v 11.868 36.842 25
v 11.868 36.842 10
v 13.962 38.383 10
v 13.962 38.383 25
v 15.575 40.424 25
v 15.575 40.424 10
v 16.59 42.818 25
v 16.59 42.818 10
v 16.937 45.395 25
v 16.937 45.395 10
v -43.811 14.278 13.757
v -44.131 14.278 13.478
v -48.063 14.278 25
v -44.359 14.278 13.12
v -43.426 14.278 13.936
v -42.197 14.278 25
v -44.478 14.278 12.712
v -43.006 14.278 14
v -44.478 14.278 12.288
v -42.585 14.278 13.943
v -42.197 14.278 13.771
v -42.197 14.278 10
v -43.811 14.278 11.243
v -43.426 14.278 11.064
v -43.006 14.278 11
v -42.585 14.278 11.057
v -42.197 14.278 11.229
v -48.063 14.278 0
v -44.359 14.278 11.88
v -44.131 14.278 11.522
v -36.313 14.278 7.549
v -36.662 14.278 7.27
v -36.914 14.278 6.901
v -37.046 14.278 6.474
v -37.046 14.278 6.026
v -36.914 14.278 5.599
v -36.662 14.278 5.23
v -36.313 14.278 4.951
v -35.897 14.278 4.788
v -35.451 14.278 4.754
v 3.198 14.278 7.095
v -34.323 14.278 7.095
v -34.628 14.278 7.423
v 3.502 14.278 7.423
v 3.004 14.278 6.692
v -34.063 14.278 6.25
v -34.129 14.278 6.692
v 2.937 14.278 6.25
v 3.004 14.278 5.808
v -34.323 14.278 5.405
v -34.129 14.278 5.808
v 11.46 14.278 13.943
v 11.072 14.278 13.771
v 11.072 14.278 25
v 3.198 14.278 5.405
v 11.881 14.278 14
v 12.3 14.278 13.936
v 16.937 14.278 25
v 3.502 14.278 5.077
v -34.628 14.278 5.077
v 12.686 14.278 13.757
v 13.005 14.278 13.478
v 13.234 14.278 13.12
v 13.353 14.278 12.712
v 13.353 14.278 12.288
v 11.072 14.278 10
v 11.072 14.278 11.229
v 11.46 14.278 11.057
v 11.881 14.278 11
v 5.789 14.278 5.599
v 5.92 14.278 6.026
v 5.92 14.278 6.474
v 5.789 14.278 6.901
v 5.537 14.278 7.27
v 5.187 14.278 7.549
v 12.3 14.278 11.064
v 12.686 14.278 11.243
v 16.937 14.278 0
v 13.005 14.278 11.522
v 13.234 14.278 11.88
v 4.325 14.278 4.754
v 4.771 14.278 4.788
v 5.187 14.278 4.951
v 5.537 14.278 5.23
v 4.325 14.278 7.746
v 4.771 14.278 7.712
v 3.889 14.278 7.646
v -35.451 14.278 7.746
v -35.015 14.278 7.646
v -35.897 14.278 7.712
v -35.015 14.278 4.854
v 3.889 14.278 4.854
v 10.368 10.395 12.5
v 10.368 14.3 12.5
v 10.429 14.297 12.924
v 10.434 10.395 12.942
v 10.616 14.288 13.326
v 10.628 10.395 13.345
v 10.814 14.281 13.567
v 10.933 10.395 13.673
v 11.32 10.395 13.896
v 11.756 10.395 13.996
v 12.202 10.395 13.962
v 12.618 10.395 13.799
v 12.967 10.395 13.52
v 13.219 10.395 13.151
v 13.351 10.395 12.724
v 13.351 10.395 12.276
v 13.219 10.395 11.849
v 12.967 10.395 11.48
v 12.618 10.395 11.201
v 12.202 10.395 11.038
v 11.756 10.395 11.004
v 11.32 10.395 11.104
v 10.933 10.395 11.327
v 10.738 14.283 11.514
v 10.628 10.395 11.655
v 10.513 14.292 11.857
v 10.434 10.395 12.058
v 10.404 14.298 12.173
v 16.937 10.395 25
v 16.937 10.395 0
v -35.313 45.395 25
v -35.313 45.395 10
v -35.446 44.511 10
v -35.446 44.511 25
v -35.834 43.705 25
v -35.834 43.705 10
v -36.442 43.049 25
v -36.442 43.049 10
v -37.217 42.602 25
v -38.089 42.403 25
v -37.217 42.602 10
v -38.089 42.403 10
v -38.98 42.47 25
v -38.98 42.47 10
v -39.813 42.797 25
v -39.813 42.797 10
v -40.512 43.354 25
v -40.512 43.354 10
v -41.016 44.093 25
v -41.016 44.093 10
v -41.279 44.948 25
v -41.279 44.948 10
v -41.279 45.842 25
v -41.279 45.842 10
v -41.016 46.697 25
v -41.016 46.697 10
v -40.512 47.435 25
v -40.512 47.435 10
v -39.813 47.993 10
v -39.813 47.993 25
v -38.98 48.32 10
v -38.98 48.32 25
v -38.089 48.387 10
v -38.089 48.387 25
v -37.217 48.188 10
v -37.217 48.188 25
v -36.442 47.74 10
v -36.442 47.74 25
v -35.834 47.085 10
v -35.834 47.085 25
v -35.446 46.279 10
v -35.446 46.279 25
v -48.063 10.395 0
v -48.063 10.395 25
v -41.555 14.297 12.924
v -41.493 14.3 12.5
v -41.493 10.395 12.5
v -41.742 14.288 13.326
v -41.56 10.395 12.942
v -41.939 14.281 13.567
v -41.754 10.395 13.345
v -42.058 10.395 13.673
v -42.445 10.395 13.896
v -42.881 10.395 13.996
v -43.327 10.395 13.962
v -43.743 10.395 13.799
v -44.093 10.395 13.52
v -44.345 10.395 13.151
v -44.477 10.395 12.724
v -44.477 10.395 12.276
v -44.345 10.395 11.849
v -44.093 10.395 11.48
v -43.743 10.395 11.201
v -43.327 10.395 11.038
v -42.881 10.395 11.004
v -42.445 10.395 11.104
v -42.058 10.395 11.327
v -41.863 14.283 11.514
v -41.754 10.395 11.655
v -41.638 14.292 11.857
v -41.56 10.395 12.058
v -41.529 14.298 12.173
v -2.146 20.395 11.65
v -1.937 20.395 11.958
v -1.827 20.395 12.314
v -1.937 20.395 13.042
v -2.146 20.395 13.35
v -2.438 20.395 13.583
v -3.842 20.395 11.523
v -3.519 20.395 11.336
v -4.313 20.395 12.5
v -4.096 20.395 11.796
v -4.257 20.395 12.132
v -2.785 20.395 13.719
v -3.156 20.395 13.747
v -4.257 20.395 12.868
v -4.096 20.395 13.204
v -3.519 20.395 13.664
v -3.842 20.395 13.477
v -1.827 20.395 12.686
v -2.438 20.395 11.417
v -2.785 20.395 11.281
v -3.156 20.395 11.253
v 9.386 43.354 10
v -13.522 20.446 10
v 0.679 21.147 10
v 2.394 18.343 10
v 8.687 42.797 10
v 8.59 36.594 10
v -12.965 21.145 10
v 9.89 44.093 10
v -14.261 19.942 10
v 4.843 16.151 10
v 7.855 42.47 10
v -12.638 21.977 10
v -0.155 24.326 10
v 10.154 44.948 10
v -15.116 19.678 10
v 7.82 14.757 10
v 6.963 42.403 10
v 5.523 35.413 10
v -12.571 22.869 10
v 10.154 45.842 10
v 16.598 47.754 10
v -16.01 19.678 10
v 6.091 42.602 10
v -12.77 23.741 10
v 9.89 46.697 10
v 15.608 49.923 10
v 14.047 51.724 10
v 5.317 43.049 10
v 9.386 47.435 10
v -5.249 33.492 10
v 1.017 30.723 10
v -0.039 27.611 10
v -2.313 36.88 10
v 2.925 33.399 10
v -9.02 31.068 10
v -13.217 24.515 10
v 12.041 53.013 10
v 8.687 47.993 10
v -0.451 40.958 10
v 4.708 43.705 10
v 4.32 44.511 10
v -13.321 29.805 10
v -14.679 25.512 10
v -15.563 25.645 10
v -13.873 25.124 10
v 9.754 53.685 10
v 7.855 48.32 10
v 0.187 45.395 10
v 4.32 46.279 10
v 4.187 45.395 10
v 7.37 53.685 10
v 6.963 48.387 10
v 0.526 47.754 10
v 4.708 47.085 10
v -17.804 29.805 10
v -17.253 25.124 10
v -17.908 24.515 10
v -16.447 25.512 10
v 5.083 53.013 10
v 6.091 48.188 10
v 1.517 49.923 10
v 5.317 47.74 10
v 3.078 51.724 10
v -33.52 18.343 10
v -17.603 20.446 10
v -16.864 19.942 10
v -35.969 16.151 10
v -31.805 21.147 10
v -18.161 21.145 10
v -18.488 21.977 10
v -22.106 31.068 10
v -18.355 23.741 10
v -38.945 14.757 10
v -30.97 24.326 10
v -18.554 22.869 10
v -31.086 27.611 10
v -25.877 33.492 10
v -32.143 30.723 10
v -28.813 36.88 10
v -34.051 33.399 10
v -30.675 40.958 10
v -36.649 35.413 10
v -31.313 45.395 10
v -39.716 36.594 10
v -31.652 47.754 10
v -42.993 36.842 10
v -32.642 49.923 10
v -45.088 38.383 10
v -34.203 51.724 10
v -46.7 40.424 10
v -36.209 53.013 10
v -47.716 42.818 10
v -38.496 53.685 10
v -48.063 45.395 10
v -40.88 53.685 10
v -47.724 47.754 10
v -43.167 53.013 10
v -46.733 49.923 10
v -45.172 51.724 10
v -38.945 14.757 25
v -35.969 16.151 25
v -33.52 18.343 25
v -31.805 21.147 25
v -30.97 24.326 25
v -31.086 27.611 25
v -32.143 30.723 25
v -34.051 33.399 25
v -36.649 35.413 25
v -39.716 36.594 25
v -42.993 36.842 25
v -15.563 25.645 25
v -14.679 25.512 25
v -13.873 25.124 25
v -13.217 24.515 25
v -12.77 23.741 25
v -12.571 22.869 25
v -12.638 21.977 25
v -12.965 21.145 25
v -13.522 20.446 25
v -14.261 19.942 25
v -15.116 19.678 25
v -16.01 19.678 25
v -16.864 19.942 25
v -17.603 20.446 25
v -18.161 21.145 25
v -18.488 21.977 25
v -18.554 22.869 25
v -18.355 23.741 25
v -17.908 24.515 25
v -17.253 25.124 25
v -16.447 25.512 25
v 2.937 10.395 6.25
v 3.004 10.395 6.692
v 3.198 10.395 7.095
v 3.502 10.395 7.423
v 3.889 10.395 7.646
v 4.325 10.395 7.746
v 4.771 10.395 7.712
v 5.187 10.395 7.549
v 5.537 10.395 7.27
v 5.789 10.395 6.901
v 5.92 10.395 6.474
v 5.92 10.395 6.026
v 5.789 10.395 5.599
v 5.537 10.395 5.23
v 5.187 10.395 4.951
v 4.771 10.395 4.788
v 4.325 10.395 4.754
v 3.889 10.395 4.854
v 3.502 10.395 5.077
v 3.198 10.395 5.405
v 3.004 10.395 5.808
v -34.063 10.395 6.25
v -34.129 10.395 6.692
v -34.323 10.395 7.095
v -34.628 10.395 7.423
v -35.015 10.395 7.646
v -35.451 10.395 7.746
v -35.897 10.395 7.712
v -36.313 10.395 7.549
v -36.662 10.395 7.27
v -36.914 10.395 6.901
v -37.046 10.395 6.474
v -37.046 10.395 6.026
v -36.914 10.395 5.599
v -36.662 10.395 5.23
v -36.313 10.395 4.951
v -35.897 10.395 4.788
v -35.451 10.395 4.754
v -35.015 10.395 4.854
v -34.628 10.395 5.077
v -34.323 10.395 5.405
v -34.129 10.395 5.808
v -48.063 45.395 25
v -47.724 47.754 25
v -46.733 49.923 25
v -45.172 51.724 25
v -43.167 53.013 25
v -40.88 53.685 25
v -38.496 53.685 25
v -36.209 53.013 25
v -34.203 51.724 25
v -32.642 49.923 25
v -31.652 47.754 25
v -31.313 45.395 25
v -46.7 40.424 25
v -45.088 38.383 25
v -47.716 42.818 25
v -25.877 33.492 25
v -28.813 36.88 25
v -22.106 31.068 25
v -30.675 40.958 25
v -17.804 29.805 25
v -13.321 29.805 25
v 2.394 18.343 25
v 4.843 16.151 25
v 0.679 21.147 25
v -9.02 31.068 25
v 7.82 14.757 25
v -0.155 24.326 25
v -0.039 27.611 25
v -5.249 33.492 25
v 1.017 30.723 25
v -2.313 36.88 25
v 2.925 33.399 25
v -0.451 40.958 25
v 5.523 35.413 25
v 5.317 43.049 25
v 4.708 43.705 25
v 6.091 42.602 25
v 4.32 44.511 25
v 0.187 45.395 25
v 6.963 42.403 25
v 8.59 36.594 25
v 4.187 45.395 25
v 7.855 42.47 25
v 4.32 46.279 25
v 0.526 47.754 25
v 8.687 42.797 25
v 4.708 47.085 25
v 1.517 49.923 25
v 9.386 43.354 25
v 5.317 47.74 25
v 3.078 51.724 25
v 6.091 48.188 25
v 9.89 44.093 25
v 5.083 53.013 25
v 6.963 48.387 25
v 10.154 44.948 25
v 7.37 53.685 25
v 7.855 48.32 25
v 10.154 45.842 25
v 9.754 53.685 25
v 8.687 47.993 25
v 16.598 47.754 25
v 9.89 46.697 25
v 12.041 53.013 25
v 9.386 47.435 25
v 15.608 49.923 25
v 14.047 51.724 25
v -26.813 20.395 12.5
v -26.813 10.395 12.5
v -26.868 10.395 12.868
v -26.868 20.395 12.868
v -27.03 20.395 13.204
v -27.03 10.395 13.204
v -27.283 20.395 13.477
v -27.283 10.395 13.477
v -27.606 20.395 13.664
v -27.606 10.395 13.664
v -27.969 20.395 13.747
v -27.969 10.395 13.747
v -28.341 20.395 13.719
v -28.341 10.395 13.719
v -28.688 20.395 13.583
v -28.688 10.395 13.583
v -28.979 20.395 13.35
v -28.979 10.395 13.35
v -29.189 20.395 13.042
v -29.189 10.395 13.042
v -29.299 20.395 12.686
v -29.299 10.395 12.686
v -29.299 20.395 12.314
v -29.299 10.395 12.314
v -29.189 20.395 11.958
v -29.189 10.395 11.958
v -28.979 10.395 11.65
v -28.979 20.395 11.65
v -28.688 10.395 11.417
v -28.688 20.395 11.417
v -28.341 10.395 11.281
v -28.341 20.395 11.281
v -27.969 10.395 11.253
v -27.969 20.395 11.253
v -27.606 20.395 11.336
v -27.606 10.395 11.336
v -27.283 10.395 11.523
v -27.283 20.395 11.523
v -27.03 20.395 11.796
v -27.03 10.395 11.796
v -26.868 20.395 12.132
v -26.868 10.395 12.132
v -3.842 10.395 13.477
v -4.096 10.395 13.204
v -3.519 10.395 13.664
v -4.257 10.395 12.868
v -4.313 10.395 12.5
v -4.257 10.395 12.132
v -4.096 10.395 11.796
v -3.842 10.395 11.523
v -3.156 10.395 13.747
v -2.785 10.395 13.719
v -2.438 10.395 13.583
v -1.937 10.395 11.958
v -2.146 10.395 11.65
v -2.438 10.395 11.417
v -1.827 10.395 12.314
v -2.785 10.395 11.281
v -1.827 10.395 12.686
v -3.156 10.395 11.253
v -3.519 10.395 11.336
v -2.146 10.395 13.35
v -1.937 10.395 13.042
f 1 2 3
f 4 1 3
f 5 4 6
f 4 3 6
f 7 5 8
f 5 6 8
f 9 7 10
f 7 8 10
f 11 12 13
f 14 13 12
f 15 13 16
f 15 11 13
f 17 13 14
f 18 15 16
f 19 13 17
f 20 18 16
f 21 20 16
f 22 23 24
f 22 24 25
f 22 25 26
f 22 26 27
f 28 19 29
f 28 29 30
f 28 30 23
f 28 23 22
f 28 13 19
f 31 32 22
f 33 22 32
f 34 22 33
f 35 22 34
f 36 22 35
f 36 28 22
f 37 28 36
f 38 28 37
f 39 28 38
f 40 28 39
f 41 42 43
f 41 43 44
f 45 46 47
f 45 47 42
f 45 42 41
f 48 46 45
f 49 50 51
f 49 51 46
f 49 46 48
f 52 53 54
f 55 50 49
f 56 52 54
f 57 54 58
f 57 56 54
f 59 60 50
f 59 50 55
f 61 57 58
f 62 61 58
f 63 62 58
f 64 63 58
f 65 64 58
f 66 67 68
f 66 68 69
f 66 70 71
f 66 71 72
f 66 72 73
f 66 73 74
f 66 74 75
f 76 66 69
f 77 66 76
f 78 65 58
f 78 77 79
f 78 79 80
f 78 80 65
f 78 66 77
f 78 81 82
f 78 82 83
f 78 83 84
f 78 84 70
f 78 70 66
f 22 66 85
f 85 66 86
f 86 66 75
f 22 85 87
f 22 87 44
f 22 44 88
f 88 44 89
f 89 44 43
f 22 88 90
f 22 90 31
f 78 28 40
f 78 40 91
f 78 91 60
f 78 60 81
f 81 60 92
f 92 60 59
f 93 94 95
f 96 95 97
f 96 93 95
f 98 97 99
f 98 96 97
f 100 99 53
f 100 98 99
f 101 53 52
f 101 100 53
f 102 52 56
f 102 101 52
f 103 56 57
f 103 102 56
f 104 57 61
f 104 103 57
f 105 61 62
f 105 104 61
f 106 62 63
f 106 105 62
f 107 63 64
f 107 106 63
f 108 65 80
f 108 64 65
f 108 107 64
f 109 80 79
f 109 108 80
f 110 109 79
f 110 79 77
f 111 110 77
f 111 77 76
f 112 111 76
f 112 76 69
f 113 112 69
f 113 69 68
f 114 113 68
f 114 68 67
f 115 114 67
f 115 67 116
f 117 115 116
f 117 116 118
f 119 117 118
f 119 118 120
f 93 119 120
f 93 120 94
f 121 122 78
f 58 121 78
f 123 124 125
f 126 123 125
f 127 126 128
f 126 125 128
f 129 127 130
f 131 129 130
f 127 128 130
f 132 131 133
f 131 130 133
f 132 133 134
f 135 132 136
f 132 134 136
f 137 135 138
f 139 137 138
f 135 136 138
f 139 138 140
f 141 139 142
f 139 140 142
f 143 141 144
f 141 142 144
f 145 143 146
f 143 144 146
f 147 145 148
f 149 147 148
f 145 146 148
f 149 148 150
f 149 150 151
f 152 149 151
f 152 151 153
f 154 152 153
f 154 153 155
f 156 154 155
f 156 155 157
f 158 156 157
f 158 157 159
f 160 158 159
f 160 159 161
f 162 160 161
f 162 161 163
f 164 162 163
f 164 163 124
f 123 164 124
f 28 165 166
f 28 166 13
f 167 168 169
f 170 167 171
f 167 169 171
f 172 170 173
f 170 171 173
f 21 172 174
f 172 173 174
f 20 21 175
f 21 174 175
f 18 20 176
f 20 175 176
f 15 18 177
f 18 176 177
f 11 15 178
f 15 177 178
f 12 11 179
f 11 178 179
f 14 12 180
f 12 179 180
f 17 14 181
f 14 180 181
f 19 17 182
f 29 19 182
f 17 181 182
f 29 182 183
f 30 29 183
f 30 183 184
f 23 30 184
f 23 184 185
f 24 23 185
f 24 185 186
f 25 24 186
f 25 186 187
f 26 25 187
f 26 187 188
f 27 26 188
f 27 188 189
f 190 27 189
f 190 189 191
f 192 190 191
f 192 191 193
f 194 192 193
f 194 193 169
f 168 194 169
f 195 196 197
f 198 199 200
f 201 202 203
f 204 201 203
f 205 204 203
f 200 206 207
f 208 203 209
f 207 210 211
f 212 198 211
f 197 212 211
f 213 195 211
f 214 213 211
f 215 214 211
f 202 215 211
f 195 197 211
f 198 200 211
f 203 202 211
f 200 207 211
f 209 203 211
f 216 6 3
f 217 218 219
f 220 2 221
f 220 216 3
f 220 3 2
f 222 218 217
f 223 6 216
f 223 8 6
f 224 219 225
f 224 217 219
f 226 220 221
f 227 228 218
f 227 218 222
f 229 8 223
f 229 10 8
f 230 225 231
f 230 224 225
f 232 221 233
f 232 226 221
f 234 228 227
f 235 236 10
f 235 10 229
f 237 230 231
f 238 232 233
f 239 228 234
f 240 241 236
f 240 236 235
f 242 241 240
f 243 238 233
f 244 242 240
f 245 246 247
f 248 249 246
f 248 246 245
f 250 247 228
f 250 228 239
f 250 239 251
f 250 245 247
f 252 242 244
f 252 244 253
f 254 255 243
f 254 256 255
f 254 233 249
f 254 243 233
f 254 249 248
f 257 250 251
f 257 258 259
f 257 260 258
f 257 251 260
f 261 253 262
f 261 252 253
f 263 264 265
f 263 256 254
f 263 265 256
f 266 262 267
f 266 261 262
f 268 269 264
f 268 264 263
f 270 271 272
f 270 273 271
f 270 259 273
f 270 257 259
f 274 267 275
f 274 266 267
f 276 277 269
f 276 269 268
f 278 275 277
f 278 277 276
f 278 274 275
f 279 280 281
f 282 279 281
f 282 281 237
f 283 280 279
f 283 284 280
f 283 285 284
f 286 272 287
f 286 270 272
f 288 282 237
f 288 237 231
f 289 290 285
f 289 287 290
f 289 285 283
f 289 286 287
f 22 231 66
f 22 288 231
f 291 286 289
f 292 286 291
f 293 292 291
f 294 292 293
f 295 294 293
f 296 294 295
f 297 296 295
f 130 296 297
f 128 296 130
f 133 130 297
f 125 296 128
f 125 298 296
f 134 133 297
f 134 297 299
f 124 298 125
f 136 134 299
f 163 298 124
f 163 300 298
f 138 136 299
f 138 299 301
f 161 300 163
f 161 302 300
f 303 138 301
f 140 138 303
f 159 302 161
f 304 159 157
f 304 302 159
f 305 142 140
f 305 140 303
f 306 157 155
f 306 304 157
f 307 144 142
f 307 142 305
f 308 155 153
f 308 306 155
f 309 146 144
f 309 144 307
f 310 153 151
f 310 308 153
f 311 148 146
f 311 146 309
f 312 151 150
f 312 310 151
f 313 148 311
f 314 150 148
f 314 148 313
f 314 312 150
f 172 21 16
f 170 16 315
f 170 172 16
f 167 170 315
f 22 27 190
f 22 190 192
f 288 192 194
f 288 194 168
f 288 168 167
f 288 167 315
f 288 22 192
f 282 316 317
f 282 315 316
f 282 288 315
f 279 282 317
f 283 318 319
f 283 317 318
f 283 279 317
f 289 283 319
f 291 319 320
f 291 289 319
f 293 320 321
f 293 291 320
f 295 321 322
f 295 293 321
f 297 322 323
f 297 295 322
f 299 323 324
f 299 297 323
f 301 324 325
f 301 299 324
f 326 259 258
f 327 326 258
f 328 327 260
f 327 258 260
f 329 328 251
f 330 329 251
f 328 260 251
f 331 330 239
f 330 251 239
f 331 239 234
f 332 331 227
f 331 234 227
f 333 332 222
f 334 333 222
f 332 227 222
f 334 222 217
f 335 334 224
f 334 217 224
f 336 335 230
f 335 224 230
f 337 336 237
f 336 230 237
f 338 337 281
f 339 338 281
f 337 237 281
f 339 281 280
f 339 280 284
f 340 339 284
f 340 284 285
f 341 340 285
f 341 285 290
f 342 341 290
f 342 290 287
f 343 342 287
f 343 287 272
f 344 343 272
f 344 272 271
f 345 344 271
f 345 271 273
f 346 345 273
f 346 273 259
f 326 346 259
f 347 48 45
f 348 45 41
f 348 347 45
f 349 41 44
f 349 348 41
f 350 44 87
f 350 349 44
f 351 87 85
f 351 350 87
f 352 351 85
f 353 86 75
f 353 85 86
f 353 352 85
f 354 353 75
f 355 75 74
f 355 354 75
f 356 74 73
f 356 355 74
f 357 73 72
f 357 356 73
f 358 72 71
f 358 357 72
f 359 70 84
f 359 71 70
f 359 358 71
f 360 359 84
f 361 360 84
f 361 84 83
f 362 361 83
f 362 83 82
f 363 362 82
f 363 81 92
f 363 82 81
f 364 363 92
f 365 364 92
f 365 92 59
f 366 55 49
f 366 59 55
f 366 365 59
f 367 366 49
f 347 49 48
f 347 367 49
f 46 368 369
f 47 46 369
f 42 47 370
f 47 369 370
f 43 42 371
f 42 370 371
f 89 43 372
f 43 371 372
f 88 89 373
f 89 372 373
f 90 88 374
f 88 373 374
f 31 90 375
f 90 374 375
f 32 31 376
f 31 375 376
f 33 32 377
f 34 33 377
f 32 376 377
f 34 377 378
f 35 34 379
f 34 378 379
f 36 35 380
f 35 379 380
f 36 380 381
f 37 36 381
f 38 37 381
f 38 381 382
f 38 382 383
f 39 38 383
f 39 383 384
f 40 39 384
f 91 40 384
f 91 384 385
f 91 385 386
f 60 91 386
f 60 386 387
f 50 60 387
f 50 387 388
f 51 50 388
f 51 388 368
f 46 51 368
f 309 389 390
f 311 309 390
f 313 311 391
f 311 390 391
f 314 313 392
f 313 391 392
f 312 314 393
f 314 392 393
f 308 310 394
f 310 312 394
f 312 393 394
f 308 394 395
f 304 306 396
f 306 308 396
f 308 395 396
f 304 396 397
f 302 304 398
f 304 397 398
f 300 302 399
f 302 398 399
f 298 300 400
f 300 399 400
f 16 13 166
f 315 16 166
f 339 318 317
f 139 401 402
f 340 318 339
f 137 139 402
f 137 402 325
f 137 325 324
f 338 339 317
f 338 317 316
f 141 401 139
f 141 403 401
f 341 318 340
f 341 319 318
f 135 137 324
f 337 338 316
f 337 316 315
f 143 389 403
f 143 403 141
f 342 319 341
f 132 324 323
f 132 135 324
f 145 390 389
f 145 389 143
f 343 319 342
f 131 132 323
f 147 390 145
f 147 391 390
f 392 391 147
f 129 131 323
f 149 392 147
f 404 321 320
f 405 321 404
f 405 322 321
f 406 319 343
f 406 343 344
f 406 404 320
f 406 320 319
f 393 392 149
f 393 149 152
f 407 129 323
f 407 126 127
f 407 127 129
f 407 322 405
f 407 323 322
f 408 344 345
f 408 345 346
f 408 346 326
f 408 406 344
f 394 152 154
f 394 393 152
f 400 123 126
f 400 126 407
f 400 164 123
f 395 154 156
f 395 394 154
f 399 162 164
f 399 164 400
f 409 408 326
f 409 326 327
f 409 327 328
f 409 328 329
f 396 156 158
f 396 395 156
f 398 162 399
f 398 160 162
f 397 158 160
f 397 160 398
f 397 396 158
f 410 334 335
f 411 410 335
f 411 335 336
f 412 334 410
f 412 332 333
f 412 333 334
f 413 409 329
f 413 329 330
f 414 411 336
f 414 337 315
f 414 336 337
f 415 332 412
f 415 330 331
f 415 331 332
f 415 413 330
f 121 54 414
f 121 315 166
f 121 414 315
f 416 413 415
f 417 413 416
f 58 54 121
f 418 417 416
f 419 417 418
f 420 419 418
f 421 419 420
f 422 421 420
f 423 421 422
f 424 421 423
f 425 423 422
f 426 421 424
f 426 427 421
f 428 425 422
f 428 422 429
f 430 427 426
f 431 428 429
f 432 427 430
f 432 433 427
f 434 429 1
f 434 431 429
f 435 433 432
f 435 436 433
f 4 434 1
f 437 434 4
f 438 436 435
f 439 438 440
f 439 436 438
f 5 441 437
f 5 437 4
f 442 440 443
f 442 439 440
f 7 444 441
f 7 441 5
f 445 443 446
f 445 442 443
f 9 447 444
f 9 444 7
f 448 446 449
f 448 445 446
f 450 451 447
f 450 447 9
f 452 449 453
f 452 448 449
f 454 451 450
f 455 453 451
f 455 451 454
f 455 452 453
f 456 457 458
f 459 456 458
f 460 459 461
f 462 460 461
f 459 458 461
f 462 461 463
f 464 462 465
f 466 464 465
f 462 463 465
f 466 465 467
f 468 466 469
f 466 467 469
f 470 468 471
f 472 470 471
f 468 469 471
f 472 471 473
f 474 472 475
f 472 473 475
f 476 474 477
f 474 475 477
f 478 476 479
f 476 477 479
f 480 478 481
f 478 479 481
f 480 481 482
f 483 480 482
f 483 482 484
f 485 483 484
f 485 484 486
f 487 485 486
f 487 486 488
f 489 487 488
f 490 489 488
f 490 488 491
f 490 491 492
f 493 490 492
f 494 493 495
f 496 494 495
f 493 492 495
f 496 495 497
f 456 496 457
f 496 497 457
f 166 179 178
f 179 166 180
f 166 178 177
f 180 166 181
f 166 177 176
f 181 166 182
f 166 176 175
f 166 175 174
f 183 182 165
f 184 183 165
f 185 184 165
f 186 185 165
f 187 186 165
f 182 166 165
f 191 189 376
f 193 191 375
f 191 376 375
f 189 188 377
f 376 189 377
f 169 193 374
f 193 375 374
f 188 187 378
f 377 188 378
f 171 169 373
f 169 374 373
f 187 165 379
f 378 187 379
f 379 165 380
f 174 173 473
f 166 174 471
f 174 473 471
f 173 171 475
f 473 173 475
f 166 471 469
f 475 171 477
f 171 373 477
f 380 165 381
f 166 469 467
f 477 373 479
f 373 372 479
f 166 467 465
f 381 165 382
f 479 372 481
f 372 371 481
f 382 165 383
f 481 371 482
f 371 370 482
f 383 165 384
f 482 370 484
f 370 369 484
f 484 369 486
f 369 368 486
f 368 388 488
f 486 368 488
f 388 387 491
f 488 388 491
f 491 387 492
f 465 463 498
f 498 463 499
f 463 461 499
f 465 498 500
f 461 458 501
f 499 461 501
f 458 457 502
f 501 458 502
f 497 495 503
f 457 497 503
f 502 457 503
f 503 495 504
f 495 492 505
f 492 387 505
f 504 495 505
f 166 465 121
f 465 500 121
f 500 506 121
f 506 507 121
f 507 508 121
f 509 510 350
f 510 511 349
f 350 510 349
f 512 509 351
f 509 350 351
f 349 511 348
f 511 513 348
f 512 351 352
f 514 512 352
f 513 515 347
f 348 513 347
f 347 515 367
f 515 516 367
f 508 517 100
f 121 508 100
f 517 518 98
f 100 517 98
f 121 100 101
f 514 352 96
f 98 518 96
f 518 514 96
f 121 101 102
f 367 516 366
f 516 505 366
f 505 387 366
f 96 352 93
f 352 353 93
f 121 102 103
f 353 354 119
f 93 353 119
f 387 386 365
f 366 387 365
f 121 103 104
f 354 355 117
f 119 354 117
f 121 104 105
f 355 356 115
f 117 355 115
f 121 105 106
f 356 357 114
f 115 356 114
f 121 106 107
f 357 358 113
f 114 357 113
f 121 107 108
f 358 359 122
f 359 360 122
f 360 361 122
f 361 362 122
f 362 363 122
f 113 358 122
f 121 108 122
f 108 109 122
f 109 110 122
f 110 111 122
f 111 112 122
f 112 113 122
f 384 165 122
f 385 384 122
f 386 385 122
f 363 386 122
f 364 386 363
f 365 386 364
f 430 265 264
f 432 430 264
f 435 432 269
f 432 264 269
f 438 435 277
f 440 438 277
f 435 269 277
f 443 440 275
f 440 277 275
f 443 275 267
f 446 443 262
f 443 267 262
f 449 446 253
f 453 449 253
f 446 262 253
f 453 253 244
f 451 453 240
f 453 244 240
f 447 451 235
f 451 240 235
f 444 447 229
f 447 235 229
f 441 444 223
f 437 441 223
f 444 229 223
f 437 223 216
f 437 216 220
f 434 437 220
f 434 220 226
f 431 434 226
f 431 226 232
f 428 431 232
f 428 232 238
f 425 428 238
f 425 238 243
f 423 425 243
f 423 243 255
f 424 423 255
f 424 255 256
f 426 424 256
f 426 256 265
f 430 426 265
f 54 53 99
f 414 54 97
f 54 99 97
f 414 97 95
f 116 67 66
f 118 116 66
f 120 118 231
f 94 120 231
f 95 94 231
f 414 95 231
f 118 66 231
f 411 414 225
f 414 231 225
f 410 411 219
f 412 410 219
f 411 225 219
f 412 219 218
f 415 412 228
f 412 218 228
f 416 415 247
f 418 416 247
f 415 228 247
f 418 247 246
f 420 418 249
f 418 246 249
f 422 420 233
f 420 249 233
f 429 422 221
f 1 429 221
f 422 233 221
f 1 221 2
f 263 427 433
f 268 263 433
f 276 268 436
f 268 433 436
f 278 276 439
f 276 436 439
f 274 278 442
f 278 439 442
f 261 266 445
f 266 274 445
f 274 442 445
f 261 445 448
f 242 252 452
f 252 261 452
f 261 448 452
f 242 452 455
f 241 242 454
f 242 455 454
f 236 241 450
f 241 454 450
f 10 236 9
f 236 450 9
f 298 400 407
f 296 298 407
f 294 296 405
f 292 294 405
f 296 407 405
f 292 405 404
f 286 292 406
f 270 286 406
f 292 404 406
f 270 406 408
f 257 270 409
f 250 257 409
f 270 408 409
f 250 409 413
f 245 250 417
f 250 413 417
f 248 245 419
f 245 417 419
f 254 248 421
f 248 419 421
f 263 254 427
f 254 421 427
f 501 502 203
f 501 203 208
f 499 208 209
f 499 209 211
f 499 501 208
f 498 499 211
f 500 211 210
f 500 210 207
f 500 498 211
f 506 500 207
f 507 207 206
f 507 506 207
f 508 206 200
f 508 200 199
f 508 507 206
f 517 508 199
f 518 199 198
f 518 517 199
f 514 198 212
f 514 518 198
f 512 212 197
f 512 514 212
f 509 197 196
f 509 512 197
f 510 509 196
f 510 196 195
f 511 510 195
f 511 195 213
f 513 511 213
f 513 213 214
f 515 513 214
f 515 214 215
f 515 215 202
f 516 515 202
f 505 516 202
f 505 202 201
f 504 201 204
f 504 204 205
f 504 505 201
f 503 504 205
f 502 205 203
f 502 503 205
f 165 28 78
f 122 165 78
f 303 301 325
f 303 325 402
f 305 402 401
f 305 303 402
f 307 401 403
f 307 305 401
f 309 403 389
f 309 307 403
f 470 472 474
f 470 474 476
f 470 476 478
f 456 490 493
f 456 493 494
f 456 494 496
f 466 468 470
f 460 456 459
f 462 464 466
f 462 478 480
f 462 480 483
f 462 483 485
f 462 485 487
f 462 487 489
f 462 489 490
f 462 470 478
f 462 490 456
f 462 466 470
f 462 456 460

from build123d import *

# Parameters (mm, degrees)
SKETCH_1_W               = 65
SKETCH_1_H               = 70
EXTRUDE_1_DEPTH          = 25
SKETCH_2_R               = 15.75
CUT_EXTRUDE_1_DEPTH      = 26
SKETCH_4_R               = 3
CUT_EXTRUDE_2_DEPTH      = 40
PATTERN_CIRCULAR_1_COUNT = 4
CUT_EXTRUDE_3_DEPTH      = 26
CUT_EXTRUDE_START        = -26
CUT_EXTRUDE_5_DEPTH      = 46
SKETCH_8_R               = 1.25
SKETCH_8_R_2             = 1.5
CUT_EXTRUDE_6_DEPTH      = 10
SKETCH_9_W               = 81.802440552
SKETCH_9_H               = 62.233215756
CUT_EXTRUDE_7_DEPTH      = 10


with BuildPart() as part:
    # 草图1 → 凸台-拉伸1 (new body)
    with BuildSketch(Plane.XY):
        with Locations((-15.56280925, 45.394966444)):
            Rectangle(SKETCH_1_W, SKETCH_1_H)
    extrude(amount=EXTRUDE_1_DEPTH)

    # 草图2 → 切除-拉伸1 (cut, through all)
    with BuildSketch(Plane.XY.offset(25)):
        with Locations((-15.56280925, 45.394966444)):
            Circle(SKETCH_2_R)
    extrude(amount=-CUT_EXTRUDE_1_DEPTH, mode=Mode.SUBTRACT)

    # 草图4 → 切除-拉伸2 (cut)
    with BuildSketch(Plane(origin=(0, 0, 0), x_dir=(-1, 0, 0), z_dir=(0, 0, -1))):
        with Locations((-7.18719075, 45.394966444)):
            Circle(SKETCH_4_R)
    cut_extrude_2 = extrude(amount=-CUT_EXTRUDE_2_DEPTH, mode=Mode.SUBTRACT)

    # 阵列(圆周)1: 切除-拉伸2 ×4 about axis
    pattern_circular_1_axis = Axis((-15.56280925, 45.394966444, 0), (0, 0, 1))
    for i in range(1, PATTERN_CIRCULAR_1_COUNT):
        add(cut_extrude_2.rotate(pattern_circular_1_axis, i * 360 / PATTERN_CIRCULAR_1_COUNT), mode=Mode.SUBTRACT)

    # 草图6 → 切除-拉伸3 (cut, through all)
    with BuildSketch(Plane.XY.offset(25)):
        with BuildLine():
            Line((-31.31280925, 45.394966444), (0.18719075, 45.394966444))
            ThreePointArc((0.18719075, 45.394966444), (8.56219075, 53.769966444), (16.93719075, 45.394966444))
            Line((16.93719075, 45.394966444), (16.93719075, 80.394966444))
            Line((16.93719075, 80.394966444), (-48.06280925, 80.394966444))
            Line((-48.06280925, 80.394966444), (-48.06280925, 45.394966444))
            ThreePointArc((-48.06280925, 45.394966444), (-39.68780925, 53.769966444), (-31.31280925, 45.394966444))
        make_face()
    extrude(amount=-CUT_EXTRUDE_3_DEPTH, mode=Mode.SUBTRACT)

    # 草图7 → 切除-拉伸5 (cut)
    with BuildSketch(Plane.XY.offset(25).offset(CUT_EXTRUDE_START)):
        with BuildLine():
            Line((-48.06280925, 45.394966444), (-48.06280925, 14.278358566))
            Line((-48.06280925, 14.278358566), (-42.197147473, 14.278358566))
            ThreePointArc((-42.197147473, 14.278358566), (-30.908342931, 25.972564608), (-42.993400823, 36.841922394))
            ThreePointArc((-42.993400823, 36.841922394), (-46.700248306, 40.423712469), (-48.06280925, 45.394966444))
        make_face()
    cut_extrude_5 = extrude(amount=CUT_EXTRUDE_5_DEPTH, mode=Mode.SUBTRACT)

    # 镜向1: 切除-拉伸5 across plane
    add(cut_extrude_5.mirror(Plane.ZY.offset(15.56280925)), mode=Mode.SUBTRACT)

    # 草图8 → 切除-拉伸6 (cut)
    with BuildSketch(Plane.XZ.offset(-10.394966444)):
        with Locations((-28.06280925, 12.5)):
            Circle(SKETCH_8_R)
        with Locations((-42.993400823, 12.5)):
            Circle(SKETCH_8_R_2)
        with Locations((-35.56280925, 6.25)):
            Circle(SKETCH_8_R_2)
    cut_extrude_6 = extrude(amount=-CUT_EXTRUDE_6_DEPTH, mode=Mode.SUBTRACT)

    # 镜向2: 切除-拉伸6 across plane
    add(cut_extrude_6.mirror(Plane.ZY.offset(15.56280925)), mode=Mode.SUBTRACT)

    # 草图9 → 切除-拉伸7 (cut)
    with BuildSketch(Plane(origin=(0, 0, 0), x_dir=(-1, 0, 0), z_dir=(0, 0, -1))):
        with Locations((15.56280925, 45.394966444)):
            Rectangle(SKETCH_9_W, SKETCH_9_H)
    extrude(amount=-CUT_EXTRUDE_7_DEPTH, mode=Mode.SUBTRACT)


solid = part.part
